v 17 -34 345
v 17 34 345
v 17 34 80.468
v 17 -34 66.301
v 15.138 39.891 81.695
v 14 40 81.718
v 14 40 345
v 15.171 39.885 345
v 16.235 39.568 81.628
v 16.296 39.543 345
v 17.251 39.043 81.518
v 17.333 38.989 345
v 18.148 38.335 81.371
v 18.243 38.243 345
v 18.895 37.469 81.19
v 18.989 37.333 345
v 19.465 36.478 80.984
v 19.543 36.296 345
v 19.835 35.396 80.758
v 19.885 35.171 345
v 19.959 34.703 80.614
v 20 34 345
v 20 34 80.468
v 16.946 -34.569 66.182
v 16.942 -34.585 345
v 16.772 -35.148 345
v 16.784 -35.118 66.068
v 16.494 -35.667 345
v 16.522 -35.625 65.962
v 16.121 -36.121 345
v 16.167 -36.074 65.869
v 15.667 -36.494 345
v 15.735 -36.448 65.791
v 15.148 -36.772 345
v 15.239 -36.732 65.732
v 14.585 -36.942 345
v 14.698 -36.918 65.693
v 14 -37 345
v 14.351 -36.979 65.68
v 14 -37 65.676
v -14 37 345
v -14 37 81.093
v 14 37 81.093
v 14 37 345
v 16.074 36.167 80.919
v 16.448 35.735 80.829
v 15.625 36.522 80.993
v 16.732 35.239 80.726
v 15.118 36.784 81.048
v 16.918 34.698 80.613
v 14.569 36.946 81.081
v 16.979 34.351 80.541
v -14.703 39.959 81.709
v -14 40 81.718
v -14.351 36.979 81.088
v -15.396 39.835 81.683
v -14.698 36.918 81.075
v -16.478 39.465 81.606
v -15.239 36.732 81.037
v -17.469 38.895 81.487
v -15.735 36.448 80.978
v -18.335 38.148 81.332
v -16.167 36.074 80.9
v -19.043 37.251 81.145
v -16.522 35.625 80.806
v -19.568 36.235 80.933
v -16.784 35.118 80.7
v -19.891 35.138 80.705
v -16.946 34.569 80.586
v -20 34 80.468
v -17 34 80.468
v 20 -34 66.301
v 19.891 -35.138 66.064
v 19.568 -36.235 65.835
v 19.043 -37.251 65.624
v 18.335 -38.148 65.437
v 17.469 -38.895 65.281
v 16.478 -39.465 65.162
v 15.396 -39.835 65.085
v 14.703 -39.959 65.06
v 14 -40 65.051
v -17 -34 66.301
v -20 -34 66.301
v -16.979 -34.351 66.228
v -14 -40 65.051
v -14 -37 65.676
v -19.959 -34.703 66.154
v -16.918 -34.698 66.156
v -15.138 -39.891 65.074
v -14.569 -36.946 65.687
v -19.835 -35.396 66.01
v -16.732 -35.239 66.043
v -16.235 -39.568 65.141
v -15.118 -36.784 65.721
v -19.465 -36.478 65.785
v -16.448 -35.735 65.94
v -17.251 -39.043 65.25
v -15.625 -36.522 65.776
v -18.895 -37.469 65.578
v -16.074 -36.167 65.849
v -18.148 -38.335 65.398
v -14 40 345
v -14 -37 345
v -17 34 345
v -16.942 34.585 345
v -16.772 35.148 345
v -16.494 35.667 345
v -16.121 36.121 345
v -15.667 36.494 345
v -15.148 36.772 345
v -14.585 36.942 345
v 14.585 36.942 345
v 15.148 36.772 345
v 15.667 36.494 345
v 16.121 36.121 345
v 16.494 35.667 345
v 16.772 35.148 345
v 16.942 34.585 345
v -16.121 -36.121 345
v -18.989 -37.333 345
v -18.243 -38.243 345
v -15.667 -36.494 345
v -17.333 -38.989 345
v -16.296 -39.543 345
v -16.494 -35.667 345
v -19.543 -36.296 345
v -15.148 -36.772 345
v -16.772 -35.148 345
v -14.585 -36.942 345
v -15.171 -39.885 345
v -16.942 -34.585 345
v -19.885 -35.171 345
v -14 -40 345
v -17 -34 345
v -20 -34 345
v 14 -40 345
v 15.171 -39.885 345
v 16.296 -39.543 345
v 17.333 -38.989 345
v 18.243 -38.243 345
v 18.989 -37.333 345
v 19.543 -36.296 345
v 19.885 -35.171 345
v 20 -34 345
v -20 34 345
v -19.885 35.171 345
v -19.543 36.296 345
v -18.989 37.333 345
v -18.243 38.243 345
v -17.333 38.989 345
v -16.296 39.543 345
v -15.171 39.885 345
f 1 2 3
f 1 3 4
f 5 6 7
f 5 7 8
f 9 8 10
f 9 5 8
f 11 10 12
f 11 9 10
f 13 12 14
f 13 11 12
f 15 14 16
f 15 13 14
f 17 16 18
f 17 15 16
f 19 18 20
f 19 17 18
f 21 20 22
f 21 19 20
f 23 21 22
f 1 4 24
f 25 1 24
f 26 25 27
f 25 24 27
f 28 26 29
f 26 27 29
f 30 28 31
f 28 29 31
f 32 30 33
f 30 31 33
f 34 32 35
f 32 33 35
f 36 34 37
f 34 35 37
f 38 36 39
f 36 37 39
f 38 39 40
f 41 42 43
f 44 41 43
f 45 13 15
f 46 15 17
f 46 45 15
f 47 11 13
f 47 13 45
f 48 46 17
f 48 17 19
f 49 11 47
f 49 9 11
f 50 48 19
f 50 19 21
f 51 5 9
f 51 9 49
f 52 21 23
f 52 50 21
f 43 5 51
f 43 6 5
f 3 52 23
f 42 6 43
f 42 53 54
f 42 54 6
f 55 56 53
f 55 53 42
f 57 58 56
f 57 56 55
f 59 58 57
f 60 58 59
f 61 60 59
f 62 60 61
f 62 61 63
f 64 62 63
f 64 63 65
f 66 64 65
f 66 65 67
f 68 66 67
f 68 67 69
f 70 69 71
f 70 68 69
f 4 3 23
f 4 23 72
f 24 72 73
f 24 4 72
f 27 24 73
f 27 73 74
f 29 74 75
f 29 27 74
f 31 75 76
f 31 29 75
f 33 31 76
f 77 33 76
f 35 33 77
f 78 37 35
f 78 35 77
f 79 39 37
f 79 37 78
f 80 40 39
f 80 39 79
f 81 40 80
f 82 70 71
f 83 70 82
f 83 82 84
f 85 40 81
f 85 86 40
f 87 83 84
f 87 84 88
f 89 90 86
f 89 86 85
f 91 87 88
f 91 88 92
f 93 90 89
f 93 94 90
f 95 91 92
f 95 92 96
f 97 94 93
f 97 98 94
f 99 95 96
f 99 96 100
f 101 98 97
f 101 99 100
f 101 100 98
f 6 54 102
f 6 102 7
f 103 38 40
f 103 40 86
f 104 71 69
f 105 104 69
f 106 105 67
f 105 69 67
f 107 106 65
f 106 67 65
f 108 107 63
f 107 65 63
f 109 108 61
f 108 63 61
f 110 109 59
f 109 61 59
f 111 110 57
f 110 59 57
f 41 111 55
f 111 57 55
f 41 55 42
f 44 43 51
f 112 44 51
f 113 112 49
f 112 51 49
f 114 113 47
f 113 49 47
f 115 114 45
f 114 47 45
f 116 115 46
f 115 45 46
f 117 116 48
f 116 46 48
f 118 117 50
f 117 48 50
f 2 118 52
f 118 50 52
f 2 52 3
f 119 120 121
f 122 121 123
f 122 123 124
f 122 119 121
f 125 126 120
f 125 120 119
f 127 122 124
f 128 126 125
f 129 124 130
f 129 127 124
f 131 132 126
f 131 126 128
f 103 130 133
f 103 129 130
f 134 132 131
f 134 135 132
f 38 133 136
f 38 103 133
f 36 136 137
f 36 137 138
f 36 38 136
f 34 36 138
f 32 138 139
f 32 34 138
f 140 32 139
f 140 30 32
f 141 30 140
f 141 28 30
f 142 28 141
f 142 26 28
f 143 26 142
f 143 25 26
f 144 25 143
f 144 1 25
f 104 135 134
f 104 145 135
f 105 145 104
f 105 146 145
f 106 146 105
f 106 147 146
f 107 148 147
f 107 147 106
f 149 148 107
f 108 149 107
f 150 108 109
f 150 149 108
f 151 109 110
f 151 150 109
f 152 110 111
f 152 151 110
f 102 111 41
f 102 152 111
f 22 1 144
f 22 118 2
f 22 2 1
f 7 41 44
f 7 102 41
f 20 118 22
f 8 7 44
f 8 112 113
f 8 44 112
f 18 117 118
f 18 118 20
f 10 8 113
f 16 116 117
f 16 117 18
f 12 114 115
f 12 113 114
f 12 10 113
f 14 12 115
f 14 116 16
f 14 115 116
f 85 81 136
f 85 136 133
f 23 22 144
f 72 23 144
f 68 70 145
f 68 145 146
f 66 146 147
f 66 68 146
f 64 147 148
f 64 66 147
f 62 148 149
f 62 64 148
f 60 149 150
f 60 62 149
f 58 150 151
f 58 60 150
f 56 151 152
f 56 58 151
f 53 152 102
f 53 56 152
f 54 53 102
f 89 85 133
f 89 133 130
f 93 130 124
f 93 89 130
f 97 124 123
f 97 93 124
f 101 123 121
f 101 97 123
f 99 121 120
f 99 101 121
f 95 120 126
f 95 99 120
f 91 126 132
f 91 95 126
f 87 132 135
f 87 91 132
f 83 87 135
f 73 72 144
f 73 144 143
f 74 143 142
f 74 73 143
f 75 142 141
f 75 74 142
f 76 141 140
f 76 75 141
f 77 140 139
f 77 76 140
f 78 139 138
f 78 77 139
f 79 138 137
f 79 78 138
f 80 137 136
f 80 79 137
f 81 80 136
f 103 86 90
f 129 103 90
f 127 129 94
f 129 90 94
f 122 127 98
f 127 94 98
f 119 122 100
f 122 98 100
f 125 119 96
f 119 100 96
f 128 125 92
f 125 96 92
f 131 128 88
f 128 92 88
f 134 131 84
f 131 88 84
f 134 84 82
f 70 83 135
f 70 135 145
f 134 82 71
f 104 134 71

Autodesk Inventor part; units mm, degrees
ref_plane "Start Plane" through (0, 0, 65.051) normal (0, 0, 1) x (1, 0, 0)
ref_plane "End Plane" through (0, 0, 345) normal (0, 0, 1) x (1, 0, 0)
sketch "Sketch" plane through (0, 0, 0) normal (0, 0, 1) x (1, 0, 0)
  line L0 (-20, -34) -> (-20, 34)
  line L1 (-14, 40) -> (14, 40)
  line L2 (20, 34) -> (20, -34)
  line L3 (14, -40) -> (-14, -40)
  arc A0 (-20, -34) -> (-14, -40) centre (-14, -34) ccw
  arc A1 (20, 34) -> (14, 40) centre (14, 34) ccw
  arc A2 (-14, 40) -> (-20, 34) centre (-14, 34) ccw
  arc A3 (14, -40) -> (20, -34) centre (14, -34) ccw
  arc A4 (-14, 37) -> (-17, 34) centre (-14, 34) ccw
  line L4 (-14, 37) -> (14, 37)
  arc A5 (17, 34) -> (14, 37) centre (14, 34) ccw
  line L5 (17, 34) -> (17, -34)
  arc A6 (14, -37) -> (17, -34) centre (14, -34) ccw
  line L6 (14, -37) -> (-14, -37)
  arc A7 (-17, -34) -> (-14, -37) centre (-14, -34) ccw
  line L7 (-17, -34) -> (-17, 34)
  line L8 (0, 57.7397) -> (0, -57.7397) construction
  line L9 (-29.7397, 0) -> (29.7397, 0) construction
  dimension "d7" = 6
  dimension "d9" = 40
  dimension "d11" = 80
  dimension "d12" = 3
  dimension "d15" = 20
  dimension "d16" = 40
extrude "Body" add sketch "Sketch" along normal up to surface (279.949 mm away) from surface at 65.051
sketch "Sketch3" plane through (0, 0, 0) normal (0, 0, 1) x (1, 0, 0)
  line L0 (0, 0) -> (10, 0)
ref_plane "Work Plane3" through (0, 0, 0) normal (0, -1, 0) x (1, 0, 0)
ref_plane "Work Plane4" through (-14, 623.6837, 203.3184) normal (0, 0.2039543, -0.9789804) x (1, 0, 0)
split "Split1" plane through (-14, 623.6837, 203.3184) removes the side toward (0, 0.2039543, -0.9789804)
sketch "Sketch4" plane through (0, 0, 0) normal (0, -1, 0) x (1, 0, 0)
  line L0 (-2, 65.051) -> (12, 65.051) projected
  line L1 (-2, 345) -> (12, 345) projected
  dimension "d18" = 279.949
equation "\"d7\" = G_IR"
equation "\"d9\" = G_W"
equation "\"d11\" = G_H"
equation "\"d12\" = G_T"
equation "\"d15\" = 0.5 * d9"
equation "\"d16\" = 0.5 * d11"
equation "\"d3\" = G_L"
equation "\"G_W\" = 40"
equation "\"G_H\" = 80"
equation "\"G_T\" = 3"
equation "\"G_IR\" = 6"
equation "\"G_L\" = d18"
equation "\"G_OFFSET_START\" = -65.051"
equation "\"d13\" = -G_OFFSET_START"
equation "\"d14\" = G_OFFSET_END + B_L"
equation "\"B_L\" = 425"
equation "\"G_OFFSET_END\" = -80"
properties part number "ISO 10799-2 - 80x40x3 - 279.95" material "Steel, Mild"
